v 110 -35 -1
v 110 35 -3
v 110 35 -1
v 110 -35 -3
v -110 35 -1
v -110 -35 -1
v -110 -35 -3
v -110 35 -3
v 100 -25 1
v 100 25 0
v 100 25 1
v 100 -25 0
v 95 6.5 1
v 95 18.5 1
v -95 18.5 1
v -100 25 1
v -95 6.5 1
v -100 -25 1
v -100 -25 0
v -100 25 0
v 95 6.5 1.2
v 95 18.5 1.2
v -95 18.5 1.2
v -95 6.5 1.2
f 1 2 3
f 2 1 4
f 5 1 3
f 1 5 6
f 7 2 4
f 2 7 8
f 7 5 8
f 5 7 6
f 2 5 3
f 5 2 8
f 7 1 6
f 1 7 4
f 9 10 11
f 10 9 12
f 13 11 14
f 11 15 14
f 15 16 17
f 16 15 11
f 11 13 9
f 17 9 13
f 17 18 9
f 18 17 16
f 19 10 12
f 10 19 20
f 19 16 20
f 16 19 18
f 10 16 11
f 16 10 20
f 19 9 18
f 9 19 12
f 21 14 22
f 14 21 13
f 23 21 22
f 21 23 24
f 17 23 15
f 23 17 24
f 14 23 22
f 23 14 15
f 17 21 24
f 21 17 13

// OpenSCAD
// ==========================================
// SURFACE DIELECTRIC BARRIER DISCHARGE (DBD)
// COLD PLASMA RETROFIT ACTUATOR STRIP SPEC
// ==========================================

$fn = 40;

// --- STRIP COMPONENT DIMENSIONS (mm) ---
strip_length = 200;
strip_width  = 50;

dielectric_thick = 1.0; // Kapton film layer thickness
electrode_thick  = 0.2; // 3oz Copper tape thickness
electrode_width  = 12.0;

// --- COLOR PROFILE ---
kapton_amber   = [0.72, 0.43, 0.12, 0.8]; // Translucent polyimide dielectric
copper_foil    = [0.85, 0.43, 0.24, 1.0]; // Metallic copper electrodes
plasma_cyan    = [0.0, 0.9, 1.0, 0.45];   // Ionized cold electron glow
f14_skin_color = [0.55, 0.58, 0.62, 1.0]; // Ghost Gray airframe surface

// ==========================================
// MODEL ASSEMBLY TREE
// ==========================================

module cold_plasma_assembly() {
    // 1. Baseline Simulation: F-14 Leading Edge Skin Panel Area
    color(f14_skin_color)
        translate([0, 0, -2])
        cube([strip_length + 20, strip_width + 20, 2], center=true);

    // 2. The Dielectric Barrier (Flexible Kapton Tape Film Foundation)
    color(kapton_amber)
        translate([0, 0, dielectric_thick/2])
        cube([strip_length, strip_width, dielectric_thick], center=true);

    // 3. Encapsulated Ground Electrode (Sub-surface copper track)
    color(copper_foil)
        translate([0, -strip_width/4, electrode_thick/2])
        cube([strip_length - 10, electrode_width, electrode_thick], center=true);

    // 4. Exposed Surface Electrode (Offset horizontally from the ground strip)
    color(copper_foil)
        translate([0, strip_width/4, dielectric_thick + electrode_thick/2])
        cube([strip_length - 10, electrode_width, electrode_thick], center=true);

    // 5. RADAR SHIELD VISUALIZATION: Cold Low-Temperature Ionization Glow
    // This is the active, non-thermal electron cloud that absorbs incoming X-band waves [1]
    color(plasma_cyan)
        translate([0, 0, dielectric_thick + 8])
        %cube([strip_length - 5, strip_width - 5, 12], center=true);
}

// Execute complete render node
cold_plasma_assembly();
